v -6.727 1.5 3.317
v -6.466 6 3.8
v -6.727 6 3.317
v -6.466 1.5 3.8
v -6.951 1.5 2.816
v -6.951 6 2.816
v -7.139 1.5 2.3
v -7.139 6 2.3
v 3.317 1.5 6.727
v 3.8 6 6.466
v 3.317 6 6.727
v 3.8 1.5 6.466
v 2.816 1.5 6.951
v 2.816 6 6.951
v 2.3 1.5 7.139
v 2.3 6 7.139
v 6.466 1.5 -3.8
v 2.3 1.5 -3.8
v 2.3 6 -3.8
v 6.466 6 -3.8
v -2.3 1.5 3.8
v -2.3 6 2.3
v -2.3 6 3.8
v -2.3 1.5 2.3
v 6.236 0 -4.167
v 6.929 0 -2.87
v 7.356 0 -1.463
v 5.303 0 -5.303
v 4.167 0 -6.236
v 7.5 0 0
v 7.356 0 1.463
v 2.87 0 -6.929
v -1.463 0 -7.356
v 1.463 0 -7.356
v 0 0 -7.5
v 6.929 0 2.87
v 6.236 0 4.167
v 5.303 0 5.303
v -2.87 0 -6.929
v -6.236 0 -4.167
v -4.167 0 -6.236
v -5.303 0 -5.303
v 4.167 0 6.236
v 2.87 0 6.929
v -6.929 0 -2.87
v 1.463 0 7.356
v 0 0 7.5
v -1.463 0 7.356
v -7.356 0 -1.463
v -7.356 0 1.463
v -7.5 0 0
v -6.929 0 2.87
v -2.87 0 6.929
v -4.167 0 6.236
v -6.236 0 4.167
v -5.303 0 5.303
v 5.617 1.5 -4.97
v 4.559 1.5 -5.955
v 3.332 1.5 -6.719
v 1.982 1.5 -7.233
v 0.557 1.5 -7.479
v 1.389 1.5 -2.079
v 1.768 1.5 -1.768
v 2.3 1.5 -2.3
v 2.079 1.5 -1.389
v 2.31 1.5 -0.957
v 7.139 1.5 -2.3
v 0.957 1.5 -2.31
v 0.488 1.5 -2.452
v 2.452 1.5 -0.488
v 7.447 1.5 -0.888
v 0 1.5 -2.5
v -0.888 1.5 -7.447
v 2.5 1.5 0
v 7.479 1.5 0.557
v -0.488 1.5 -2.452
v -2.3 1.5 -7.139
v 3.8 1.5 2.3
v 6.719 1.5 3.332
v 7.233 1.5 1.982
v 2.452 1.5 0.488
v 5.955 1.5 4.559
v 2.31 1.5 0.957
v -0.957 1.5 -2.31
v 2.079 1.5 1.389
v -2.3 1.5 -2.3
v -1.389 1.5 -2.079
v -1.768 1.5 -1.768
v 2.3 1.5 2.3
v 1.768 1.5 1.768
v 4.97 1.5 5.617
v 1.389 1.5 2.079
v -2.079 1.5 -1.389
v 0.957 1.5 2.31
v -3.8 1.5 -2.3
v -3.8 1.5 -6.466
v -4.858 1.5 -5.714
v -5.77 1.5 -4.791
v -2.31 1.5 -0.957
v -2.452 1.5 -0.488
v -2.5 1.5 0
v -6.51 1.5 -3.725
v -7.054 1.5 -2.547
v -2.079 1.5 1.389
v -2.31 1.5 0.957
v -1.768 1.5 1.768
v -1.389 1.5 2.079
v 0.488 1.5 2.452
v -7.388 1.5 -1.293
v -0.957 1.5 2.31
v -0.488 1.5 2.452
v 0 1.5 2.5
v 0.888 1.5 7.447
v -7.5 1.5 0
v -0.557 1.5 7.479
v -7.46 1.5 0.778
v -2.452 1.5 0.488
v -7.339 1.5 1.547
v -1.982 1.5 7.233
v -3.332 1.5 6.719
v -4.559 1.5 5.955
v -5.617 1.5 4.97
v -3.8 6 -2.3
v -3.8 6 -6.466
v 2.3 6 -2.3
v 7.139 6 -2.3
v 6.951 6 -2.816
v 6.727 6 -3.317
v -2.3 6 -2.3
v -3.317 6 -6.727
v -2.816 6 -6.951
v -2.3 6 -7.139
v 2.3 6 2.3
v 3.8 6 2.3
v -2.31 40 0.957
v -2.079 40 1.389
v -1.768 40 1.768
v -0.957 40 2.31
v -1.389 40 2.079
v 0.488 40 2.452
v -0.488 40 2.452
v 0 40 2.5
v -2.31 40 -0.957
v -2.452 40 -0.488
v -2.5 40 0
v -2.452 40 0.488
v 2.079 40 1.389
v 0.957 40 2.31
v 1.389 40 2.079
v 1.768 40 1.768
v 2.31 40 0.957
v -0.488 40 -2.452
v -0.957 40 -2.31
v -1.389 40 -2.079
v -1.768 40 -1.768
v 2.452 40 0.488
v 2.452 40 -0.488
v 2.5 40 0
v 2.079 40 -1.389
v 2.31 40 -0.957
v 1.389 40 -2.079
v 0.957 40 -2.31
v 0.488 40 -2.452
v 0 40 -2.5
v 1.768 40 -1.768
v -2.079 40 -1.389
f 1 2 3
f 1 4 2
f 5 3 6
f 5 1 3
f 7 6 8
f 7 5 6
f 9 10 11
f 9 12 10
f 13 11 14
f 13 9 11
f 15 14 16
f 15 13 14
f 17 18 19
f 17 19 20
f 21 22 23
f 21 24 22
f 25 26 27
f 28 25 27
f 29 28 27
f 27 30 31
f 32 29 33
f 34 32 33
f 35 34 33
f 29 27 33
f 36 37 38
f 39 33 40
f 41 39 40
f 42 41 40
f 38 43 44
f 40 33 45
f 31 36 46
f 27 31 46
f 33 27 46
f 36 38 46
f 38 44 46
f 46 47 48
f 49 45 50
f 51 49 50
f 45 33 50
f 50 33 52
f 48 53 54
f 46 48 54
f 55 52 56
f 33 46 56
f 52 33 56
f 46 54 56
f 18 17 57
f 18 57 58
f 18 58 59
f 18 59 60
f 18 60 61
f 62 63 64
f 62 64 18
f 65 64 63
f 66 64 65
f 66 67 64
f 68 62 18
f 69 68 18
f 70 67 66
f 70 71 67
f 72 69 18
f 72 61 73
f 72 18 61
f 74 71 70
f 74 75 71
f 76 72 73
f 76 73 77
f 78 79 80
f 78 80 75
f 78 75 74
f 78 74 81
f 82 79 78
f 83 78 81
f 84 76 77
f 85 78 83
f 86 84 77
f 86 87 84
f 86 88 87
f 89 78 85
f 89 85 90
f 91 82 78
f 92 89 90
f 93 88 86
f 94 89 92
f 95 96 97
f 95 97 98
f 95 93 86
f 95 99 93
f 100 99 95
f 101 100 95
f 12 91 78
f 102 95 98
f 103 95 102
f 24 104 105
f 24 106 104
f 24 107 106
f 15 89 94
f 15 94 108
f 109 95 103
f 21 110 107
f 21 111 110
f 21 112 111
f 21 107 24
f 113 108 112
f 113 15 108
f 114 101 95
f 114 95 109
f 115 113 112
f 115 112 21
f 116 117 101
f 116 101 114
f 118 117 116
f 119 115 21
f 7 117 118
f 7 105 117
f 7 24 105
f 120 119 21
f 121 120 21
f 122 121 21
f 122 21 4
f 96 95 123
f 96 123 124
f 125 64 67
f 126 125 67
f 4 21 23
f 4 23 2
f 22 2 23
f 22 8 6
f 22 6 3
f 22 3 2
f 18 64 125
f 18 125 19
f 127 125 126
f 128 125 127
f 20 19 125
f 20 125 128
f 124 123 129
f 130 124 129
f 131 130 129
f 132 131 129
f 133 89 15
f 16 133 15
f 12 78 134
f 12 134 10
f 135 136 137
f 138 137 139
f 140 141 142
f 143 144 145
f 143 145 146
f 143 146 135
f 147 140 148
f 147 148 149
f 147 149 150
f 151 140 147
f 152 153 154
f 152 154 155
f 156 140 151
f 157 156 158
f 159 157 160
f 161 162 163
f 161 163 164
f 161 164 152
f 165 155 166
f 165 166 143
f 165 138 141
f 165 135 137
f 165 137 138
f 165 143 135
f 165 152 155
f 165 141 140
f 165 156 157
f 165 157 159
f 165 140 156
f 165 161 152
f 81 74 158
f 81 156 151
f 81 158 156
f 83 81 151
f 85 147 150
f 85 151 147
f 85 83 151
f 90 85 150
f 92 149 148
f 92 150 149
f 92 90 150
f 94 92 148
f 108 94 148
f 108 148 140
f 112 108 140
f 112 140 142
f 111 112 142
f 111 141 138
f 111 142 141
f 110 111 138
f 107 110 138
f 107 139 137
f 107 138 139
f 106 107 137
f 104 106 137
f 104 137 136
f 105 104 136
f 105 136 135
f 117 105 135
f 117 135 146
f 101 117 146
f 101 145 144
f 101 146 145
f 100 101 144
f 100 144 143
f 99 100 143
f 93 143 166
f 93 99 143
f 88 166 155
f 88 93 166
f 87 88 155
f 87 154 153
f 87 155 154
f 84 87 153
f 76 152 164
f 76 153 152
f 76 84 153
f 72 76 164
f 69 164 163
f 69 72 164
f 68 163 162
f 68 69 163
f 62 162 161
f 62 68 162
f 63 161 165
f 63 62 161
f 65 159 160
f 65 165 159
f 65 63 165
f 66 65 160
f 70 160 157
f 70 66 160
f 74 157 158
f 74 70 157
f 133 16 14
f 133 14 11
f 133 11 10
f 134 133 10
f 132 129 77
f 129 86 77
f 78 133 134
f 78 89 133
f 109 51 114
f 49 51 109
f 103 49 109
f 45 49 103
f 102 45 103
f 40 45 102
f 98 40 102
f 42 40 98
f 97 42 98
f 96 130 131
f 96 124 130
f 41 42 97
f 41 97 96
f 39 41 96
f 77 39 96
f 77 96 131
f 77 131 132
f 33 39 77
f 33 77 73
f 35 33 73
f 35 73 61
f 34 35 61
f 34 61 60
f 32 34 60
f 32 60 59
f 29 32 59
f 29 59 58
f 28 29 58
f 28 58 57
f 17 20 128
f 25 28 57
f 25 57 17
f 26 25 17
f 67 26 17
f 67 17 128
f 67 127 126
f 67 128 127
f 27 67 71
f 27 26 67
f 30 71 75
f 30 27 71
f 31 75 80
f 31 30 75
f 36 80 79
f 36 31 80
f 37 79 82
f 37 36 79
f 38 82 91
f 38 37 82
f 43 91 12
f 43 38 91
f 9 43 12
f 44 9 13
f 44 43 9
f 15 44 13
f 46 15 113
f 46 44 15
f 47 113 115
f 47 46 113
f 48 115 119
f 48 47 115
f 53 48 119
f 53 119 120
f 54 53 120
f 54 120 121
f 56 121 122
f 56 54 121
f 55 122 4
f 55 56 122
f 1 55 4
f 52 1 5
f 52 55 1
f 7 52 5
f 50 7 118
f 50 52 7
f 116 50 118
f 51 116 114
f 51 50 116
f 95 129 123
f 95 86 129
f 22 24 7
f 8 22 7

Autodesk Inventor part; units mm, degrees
ref_plane "YZ Plane" through (0, 0, 0) normal (1, 0, 0) x (0, 1, 0)
ref_plane "XZ Plane" through (0, 0, 0) normal (0, 1, 0) x (-1, 0, 0)
ref_plane "XY Plane" through (0, 0, 0) normal (0, 0, 1) x (1, 0, 0)
sketch "Sketch1" plane through (0, 0, 0) normal (0, 1, 0) x (-1, 0, 0)
  circle A0 centre (0, 0) radius 7.5
  circle A1 centre (0, 0) radius 2.5
  dimension "d0" = 15
  dimension "d1" = 5
extrude "Extrusion1" add sketch "Sketch1" along normal blind 1.5 contours A0 | A1
sketch "Sketch2" plane through (0, 1.5, 0) normal (0, 1, 0) x (1, 0, 0)
  circle A0 centre (0, 0) radius 2.5
  circle A1 centre (0, 0) radius 7.5 projected
  line L0 (-0.9798, 2.3) -> (-7.1386, 2.3)
  circle A2 centre (0, 0) radius 7.5 projected
  line L1 (-2.3, 0.9798) -> (-2.3, 7.1386)
  line L2 (-2.3, 7.1386) -> (-7.1386, 2.3)
  line L3 (-3.8, 2.3) -> (-3.8, 6.4661)
  line L4 (-2.3, -0.9798) -> (-2.3, -7.1386)
  line L5 (-0.9798, -2.3) -> (-7.1386, -2.3)
  line L6 (-2.3, -3.8) -> (-6.4661, -3.8)
  line L7 (-7.1386, -2.3) -> (-2.3, -7.1386)
  line L8 (0.9798, -2.3) -> (7.1386, -2.3)
  line L9 (2.3, -0.9798) -> (2.3, -7.1386)
  line L10 (3.8, -2.3) -> (3.8, -6.4661)
  line L11 (2.3, -7.1386) -> (7.1386, -2.3)
  line L12 (2.3, 0.9798) -> (2.3, 7.1386)
  line L13 (0.9798, 2.3) -> (7.1386, 2.3)
  line L14 (2.3, 3.8) -> (6.4661, 3.8)
  line L15 (7.1386, 2.3) -> (2.3, 7.1386)
  point P0 (2.3, -2.3)
  point P1 (2.3, -7.1386)
  point P2 (2.3, 2.3)
  point P3 (-2.3, 2.3)
  point P4 (-2.3, -2.3)
  dimension "d4" = 5
  dimension "d5" = 2.3
  dimension "d6" = 2.3
  dimension "d7" = 6.8429
  dimension "d8" = 1.5
  dimension "d11" = 360
extrude "Extrusion2" add sketch "Sketch2" along normal blind 4.5 contours L12 L14 L15 L13 | L8 L10 L11 L9 | L15 L14 A1 | L11 L10 A1 | L0 L3 L2 L1 | L4 L6 L7 L5 | L2 L3 A1 | L7 L6 A1 picked at (6.5762, 2.972) picked at (2.972, -6.5762) picked at (-2.972, 6.5762) picked at (-6.5762, -2.972)
sketch "Sketch3" plane through (0, 1.5, 0) normal (0, 1, 0) x (1, 0, 0)
  circle A0 centre (0, 0) radius 2.5
  dimension "d15" = 5
extrude "Extrusion3" add sketch "Sketch3" along normal blind 38.5
sketch "Sketch4" plane through (0, 0, 0) normal (0, -1, 0) x (1, 0, 0)
  point P0 (0, 0)
  point P1 (0, 0)
hole "Hole1" [suppressed]
fillet "Fillet1" [suppressed]
equation "\"d6\" = d5"
properties part number "claw_nut"
